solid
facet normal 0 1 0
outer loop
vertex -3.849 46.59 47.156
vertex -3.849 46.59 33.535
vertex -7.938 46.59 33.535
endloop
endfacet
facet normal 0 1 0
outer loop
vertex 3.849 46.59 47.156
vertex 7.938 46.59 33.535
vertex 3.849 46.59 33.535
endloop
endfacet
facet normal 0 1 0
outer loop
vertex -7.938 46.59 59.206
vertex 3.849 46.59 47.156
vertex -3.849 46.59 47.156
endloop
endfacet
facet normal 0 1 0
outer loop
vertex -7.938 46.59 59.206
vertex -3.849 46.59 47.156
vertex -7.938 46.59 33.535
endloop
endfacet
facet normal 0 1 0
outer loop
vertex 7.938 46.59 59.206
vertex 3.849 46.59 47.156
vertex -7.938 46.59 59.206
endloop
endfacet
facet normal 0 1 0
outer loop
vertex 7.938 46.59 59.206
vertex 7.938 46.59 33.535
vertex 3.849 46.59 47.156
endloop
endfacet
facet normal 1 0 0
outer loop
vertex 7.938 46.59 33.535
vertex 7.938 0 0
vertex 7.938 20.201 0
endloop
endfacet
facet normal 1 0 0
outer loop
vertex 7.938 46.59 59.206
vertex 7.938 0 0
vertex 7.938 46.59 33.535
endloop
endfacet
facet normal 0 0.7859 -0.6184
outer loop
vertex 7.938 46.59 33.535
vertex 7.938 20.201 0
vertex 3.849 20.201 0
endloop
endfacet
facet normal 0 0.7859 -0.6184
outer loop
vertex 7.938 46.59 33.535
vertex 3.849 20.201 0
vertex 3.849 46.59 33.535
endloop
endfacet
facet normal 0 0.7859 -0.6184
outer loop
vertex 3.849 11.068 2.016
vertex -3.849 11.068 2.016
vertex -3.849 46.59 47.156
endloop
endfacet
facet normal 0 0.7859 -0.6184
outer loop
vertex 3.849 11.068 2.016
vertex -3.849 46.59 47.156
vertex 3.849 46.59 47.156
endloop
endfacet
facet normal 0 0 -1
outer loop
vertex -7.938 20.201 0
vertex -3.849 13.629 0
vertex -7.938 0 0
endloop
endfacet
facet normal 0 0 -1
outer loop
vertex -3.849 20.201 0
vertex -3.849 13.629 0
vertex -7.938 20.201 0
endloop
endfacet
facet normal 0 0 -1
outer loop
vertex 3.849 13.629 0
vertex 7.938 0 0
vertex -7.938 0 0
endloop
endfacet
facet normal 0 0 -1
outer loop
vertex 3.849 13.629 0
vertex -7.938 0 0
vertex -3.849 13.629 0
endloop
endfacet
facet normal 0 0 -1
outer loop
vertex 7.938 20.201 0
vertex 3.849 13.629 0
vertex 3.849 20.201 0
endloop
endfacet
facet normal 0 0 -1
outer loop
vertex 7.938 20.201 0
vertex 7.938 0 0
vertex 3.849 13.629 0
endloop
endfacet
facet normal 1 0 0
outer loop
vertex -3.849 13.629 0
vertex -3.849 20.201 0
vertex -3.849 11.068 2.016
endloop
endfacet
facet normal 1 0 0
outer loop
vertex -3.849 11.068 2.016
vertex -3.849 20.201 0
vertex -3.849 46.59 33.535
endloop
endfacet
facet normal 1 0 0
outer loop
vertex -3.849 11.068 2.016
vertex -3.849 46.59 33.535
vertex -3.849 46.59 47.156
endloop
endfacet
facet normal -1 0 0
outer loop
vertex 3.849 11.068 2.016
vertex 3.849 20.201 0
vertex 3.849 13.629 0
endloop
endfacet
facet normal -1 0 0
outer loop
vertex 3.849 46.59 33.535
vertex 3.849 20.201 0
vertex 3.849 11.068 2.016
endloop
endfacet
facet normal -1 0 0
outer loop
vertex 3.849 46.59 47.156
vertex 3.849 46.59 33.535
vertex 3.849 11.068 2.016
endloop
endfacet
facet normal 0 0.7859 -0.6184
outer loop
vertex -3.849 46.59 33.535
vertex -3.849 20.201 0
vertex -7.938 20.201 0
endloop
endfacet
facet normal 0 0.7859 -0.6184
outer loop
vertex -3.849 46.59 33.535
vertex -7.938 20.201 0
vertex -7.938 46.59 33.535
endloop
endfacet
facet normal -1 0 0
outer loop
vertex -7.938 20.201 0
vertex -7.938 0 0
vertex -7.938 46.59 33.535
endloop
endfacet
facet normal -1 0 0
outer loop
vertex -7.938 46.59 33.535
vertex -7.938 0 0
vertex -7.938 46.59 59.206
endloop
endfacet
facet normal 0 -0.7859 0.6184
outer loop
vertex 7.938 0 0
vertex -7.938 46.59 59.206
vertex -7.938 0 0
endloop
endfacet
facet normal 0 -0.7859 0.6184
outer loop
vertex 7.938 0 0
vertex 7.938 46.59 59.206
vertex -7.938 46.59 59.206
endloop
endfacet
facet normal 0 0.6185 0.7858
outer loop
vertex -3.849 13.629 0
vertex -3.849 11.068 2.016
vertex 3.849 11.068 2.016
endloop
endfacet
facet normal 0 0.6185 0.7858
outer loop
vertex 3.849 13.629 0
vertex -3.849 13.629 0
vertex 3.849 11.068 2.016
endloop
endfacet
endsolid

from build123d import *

# Parameters (mm, degrees)
F1_DEPTH      = 7.9375
F4_W          = 7.6985172927
F4_H          = 8.837191388
F5_DEPTH      = 32.041668515
F5_DEPTH_BACK = 25.4


with BuildPart() as f1:
    # F6 (on Right) → F1 (new body, symmetric)
    with BuildSketch(Plane.YZ):
        Polygon((46.5895857938, 59.2058200122), (0, 0), (20.2007462682, 0), (46.5895857938, 33.5348094786), align=None)
    extrude(amount=F1_DEPTH, both=True)

    # F4 (on face) → F5 (cut, two sides)
    with BuildSketch(Plane(origin=(0, 20.9196058881, 26.5845338574), x_dir=(1, 0, 0), z_dir=(0, -0.6184018342, -0.7858620562))) as f5_sk:
        with Locations((0, -11.8702491745)):
            Rectangle(F4_W, F4_H)
    extrude(amount=-F5_DEPTH, mode=Mode.SUBTRACT)
    extrude(f5_sk.sketch, amount=F5_DEPTH_BACK, mode=Mode.SUBTRACT)


solid = f1.part
